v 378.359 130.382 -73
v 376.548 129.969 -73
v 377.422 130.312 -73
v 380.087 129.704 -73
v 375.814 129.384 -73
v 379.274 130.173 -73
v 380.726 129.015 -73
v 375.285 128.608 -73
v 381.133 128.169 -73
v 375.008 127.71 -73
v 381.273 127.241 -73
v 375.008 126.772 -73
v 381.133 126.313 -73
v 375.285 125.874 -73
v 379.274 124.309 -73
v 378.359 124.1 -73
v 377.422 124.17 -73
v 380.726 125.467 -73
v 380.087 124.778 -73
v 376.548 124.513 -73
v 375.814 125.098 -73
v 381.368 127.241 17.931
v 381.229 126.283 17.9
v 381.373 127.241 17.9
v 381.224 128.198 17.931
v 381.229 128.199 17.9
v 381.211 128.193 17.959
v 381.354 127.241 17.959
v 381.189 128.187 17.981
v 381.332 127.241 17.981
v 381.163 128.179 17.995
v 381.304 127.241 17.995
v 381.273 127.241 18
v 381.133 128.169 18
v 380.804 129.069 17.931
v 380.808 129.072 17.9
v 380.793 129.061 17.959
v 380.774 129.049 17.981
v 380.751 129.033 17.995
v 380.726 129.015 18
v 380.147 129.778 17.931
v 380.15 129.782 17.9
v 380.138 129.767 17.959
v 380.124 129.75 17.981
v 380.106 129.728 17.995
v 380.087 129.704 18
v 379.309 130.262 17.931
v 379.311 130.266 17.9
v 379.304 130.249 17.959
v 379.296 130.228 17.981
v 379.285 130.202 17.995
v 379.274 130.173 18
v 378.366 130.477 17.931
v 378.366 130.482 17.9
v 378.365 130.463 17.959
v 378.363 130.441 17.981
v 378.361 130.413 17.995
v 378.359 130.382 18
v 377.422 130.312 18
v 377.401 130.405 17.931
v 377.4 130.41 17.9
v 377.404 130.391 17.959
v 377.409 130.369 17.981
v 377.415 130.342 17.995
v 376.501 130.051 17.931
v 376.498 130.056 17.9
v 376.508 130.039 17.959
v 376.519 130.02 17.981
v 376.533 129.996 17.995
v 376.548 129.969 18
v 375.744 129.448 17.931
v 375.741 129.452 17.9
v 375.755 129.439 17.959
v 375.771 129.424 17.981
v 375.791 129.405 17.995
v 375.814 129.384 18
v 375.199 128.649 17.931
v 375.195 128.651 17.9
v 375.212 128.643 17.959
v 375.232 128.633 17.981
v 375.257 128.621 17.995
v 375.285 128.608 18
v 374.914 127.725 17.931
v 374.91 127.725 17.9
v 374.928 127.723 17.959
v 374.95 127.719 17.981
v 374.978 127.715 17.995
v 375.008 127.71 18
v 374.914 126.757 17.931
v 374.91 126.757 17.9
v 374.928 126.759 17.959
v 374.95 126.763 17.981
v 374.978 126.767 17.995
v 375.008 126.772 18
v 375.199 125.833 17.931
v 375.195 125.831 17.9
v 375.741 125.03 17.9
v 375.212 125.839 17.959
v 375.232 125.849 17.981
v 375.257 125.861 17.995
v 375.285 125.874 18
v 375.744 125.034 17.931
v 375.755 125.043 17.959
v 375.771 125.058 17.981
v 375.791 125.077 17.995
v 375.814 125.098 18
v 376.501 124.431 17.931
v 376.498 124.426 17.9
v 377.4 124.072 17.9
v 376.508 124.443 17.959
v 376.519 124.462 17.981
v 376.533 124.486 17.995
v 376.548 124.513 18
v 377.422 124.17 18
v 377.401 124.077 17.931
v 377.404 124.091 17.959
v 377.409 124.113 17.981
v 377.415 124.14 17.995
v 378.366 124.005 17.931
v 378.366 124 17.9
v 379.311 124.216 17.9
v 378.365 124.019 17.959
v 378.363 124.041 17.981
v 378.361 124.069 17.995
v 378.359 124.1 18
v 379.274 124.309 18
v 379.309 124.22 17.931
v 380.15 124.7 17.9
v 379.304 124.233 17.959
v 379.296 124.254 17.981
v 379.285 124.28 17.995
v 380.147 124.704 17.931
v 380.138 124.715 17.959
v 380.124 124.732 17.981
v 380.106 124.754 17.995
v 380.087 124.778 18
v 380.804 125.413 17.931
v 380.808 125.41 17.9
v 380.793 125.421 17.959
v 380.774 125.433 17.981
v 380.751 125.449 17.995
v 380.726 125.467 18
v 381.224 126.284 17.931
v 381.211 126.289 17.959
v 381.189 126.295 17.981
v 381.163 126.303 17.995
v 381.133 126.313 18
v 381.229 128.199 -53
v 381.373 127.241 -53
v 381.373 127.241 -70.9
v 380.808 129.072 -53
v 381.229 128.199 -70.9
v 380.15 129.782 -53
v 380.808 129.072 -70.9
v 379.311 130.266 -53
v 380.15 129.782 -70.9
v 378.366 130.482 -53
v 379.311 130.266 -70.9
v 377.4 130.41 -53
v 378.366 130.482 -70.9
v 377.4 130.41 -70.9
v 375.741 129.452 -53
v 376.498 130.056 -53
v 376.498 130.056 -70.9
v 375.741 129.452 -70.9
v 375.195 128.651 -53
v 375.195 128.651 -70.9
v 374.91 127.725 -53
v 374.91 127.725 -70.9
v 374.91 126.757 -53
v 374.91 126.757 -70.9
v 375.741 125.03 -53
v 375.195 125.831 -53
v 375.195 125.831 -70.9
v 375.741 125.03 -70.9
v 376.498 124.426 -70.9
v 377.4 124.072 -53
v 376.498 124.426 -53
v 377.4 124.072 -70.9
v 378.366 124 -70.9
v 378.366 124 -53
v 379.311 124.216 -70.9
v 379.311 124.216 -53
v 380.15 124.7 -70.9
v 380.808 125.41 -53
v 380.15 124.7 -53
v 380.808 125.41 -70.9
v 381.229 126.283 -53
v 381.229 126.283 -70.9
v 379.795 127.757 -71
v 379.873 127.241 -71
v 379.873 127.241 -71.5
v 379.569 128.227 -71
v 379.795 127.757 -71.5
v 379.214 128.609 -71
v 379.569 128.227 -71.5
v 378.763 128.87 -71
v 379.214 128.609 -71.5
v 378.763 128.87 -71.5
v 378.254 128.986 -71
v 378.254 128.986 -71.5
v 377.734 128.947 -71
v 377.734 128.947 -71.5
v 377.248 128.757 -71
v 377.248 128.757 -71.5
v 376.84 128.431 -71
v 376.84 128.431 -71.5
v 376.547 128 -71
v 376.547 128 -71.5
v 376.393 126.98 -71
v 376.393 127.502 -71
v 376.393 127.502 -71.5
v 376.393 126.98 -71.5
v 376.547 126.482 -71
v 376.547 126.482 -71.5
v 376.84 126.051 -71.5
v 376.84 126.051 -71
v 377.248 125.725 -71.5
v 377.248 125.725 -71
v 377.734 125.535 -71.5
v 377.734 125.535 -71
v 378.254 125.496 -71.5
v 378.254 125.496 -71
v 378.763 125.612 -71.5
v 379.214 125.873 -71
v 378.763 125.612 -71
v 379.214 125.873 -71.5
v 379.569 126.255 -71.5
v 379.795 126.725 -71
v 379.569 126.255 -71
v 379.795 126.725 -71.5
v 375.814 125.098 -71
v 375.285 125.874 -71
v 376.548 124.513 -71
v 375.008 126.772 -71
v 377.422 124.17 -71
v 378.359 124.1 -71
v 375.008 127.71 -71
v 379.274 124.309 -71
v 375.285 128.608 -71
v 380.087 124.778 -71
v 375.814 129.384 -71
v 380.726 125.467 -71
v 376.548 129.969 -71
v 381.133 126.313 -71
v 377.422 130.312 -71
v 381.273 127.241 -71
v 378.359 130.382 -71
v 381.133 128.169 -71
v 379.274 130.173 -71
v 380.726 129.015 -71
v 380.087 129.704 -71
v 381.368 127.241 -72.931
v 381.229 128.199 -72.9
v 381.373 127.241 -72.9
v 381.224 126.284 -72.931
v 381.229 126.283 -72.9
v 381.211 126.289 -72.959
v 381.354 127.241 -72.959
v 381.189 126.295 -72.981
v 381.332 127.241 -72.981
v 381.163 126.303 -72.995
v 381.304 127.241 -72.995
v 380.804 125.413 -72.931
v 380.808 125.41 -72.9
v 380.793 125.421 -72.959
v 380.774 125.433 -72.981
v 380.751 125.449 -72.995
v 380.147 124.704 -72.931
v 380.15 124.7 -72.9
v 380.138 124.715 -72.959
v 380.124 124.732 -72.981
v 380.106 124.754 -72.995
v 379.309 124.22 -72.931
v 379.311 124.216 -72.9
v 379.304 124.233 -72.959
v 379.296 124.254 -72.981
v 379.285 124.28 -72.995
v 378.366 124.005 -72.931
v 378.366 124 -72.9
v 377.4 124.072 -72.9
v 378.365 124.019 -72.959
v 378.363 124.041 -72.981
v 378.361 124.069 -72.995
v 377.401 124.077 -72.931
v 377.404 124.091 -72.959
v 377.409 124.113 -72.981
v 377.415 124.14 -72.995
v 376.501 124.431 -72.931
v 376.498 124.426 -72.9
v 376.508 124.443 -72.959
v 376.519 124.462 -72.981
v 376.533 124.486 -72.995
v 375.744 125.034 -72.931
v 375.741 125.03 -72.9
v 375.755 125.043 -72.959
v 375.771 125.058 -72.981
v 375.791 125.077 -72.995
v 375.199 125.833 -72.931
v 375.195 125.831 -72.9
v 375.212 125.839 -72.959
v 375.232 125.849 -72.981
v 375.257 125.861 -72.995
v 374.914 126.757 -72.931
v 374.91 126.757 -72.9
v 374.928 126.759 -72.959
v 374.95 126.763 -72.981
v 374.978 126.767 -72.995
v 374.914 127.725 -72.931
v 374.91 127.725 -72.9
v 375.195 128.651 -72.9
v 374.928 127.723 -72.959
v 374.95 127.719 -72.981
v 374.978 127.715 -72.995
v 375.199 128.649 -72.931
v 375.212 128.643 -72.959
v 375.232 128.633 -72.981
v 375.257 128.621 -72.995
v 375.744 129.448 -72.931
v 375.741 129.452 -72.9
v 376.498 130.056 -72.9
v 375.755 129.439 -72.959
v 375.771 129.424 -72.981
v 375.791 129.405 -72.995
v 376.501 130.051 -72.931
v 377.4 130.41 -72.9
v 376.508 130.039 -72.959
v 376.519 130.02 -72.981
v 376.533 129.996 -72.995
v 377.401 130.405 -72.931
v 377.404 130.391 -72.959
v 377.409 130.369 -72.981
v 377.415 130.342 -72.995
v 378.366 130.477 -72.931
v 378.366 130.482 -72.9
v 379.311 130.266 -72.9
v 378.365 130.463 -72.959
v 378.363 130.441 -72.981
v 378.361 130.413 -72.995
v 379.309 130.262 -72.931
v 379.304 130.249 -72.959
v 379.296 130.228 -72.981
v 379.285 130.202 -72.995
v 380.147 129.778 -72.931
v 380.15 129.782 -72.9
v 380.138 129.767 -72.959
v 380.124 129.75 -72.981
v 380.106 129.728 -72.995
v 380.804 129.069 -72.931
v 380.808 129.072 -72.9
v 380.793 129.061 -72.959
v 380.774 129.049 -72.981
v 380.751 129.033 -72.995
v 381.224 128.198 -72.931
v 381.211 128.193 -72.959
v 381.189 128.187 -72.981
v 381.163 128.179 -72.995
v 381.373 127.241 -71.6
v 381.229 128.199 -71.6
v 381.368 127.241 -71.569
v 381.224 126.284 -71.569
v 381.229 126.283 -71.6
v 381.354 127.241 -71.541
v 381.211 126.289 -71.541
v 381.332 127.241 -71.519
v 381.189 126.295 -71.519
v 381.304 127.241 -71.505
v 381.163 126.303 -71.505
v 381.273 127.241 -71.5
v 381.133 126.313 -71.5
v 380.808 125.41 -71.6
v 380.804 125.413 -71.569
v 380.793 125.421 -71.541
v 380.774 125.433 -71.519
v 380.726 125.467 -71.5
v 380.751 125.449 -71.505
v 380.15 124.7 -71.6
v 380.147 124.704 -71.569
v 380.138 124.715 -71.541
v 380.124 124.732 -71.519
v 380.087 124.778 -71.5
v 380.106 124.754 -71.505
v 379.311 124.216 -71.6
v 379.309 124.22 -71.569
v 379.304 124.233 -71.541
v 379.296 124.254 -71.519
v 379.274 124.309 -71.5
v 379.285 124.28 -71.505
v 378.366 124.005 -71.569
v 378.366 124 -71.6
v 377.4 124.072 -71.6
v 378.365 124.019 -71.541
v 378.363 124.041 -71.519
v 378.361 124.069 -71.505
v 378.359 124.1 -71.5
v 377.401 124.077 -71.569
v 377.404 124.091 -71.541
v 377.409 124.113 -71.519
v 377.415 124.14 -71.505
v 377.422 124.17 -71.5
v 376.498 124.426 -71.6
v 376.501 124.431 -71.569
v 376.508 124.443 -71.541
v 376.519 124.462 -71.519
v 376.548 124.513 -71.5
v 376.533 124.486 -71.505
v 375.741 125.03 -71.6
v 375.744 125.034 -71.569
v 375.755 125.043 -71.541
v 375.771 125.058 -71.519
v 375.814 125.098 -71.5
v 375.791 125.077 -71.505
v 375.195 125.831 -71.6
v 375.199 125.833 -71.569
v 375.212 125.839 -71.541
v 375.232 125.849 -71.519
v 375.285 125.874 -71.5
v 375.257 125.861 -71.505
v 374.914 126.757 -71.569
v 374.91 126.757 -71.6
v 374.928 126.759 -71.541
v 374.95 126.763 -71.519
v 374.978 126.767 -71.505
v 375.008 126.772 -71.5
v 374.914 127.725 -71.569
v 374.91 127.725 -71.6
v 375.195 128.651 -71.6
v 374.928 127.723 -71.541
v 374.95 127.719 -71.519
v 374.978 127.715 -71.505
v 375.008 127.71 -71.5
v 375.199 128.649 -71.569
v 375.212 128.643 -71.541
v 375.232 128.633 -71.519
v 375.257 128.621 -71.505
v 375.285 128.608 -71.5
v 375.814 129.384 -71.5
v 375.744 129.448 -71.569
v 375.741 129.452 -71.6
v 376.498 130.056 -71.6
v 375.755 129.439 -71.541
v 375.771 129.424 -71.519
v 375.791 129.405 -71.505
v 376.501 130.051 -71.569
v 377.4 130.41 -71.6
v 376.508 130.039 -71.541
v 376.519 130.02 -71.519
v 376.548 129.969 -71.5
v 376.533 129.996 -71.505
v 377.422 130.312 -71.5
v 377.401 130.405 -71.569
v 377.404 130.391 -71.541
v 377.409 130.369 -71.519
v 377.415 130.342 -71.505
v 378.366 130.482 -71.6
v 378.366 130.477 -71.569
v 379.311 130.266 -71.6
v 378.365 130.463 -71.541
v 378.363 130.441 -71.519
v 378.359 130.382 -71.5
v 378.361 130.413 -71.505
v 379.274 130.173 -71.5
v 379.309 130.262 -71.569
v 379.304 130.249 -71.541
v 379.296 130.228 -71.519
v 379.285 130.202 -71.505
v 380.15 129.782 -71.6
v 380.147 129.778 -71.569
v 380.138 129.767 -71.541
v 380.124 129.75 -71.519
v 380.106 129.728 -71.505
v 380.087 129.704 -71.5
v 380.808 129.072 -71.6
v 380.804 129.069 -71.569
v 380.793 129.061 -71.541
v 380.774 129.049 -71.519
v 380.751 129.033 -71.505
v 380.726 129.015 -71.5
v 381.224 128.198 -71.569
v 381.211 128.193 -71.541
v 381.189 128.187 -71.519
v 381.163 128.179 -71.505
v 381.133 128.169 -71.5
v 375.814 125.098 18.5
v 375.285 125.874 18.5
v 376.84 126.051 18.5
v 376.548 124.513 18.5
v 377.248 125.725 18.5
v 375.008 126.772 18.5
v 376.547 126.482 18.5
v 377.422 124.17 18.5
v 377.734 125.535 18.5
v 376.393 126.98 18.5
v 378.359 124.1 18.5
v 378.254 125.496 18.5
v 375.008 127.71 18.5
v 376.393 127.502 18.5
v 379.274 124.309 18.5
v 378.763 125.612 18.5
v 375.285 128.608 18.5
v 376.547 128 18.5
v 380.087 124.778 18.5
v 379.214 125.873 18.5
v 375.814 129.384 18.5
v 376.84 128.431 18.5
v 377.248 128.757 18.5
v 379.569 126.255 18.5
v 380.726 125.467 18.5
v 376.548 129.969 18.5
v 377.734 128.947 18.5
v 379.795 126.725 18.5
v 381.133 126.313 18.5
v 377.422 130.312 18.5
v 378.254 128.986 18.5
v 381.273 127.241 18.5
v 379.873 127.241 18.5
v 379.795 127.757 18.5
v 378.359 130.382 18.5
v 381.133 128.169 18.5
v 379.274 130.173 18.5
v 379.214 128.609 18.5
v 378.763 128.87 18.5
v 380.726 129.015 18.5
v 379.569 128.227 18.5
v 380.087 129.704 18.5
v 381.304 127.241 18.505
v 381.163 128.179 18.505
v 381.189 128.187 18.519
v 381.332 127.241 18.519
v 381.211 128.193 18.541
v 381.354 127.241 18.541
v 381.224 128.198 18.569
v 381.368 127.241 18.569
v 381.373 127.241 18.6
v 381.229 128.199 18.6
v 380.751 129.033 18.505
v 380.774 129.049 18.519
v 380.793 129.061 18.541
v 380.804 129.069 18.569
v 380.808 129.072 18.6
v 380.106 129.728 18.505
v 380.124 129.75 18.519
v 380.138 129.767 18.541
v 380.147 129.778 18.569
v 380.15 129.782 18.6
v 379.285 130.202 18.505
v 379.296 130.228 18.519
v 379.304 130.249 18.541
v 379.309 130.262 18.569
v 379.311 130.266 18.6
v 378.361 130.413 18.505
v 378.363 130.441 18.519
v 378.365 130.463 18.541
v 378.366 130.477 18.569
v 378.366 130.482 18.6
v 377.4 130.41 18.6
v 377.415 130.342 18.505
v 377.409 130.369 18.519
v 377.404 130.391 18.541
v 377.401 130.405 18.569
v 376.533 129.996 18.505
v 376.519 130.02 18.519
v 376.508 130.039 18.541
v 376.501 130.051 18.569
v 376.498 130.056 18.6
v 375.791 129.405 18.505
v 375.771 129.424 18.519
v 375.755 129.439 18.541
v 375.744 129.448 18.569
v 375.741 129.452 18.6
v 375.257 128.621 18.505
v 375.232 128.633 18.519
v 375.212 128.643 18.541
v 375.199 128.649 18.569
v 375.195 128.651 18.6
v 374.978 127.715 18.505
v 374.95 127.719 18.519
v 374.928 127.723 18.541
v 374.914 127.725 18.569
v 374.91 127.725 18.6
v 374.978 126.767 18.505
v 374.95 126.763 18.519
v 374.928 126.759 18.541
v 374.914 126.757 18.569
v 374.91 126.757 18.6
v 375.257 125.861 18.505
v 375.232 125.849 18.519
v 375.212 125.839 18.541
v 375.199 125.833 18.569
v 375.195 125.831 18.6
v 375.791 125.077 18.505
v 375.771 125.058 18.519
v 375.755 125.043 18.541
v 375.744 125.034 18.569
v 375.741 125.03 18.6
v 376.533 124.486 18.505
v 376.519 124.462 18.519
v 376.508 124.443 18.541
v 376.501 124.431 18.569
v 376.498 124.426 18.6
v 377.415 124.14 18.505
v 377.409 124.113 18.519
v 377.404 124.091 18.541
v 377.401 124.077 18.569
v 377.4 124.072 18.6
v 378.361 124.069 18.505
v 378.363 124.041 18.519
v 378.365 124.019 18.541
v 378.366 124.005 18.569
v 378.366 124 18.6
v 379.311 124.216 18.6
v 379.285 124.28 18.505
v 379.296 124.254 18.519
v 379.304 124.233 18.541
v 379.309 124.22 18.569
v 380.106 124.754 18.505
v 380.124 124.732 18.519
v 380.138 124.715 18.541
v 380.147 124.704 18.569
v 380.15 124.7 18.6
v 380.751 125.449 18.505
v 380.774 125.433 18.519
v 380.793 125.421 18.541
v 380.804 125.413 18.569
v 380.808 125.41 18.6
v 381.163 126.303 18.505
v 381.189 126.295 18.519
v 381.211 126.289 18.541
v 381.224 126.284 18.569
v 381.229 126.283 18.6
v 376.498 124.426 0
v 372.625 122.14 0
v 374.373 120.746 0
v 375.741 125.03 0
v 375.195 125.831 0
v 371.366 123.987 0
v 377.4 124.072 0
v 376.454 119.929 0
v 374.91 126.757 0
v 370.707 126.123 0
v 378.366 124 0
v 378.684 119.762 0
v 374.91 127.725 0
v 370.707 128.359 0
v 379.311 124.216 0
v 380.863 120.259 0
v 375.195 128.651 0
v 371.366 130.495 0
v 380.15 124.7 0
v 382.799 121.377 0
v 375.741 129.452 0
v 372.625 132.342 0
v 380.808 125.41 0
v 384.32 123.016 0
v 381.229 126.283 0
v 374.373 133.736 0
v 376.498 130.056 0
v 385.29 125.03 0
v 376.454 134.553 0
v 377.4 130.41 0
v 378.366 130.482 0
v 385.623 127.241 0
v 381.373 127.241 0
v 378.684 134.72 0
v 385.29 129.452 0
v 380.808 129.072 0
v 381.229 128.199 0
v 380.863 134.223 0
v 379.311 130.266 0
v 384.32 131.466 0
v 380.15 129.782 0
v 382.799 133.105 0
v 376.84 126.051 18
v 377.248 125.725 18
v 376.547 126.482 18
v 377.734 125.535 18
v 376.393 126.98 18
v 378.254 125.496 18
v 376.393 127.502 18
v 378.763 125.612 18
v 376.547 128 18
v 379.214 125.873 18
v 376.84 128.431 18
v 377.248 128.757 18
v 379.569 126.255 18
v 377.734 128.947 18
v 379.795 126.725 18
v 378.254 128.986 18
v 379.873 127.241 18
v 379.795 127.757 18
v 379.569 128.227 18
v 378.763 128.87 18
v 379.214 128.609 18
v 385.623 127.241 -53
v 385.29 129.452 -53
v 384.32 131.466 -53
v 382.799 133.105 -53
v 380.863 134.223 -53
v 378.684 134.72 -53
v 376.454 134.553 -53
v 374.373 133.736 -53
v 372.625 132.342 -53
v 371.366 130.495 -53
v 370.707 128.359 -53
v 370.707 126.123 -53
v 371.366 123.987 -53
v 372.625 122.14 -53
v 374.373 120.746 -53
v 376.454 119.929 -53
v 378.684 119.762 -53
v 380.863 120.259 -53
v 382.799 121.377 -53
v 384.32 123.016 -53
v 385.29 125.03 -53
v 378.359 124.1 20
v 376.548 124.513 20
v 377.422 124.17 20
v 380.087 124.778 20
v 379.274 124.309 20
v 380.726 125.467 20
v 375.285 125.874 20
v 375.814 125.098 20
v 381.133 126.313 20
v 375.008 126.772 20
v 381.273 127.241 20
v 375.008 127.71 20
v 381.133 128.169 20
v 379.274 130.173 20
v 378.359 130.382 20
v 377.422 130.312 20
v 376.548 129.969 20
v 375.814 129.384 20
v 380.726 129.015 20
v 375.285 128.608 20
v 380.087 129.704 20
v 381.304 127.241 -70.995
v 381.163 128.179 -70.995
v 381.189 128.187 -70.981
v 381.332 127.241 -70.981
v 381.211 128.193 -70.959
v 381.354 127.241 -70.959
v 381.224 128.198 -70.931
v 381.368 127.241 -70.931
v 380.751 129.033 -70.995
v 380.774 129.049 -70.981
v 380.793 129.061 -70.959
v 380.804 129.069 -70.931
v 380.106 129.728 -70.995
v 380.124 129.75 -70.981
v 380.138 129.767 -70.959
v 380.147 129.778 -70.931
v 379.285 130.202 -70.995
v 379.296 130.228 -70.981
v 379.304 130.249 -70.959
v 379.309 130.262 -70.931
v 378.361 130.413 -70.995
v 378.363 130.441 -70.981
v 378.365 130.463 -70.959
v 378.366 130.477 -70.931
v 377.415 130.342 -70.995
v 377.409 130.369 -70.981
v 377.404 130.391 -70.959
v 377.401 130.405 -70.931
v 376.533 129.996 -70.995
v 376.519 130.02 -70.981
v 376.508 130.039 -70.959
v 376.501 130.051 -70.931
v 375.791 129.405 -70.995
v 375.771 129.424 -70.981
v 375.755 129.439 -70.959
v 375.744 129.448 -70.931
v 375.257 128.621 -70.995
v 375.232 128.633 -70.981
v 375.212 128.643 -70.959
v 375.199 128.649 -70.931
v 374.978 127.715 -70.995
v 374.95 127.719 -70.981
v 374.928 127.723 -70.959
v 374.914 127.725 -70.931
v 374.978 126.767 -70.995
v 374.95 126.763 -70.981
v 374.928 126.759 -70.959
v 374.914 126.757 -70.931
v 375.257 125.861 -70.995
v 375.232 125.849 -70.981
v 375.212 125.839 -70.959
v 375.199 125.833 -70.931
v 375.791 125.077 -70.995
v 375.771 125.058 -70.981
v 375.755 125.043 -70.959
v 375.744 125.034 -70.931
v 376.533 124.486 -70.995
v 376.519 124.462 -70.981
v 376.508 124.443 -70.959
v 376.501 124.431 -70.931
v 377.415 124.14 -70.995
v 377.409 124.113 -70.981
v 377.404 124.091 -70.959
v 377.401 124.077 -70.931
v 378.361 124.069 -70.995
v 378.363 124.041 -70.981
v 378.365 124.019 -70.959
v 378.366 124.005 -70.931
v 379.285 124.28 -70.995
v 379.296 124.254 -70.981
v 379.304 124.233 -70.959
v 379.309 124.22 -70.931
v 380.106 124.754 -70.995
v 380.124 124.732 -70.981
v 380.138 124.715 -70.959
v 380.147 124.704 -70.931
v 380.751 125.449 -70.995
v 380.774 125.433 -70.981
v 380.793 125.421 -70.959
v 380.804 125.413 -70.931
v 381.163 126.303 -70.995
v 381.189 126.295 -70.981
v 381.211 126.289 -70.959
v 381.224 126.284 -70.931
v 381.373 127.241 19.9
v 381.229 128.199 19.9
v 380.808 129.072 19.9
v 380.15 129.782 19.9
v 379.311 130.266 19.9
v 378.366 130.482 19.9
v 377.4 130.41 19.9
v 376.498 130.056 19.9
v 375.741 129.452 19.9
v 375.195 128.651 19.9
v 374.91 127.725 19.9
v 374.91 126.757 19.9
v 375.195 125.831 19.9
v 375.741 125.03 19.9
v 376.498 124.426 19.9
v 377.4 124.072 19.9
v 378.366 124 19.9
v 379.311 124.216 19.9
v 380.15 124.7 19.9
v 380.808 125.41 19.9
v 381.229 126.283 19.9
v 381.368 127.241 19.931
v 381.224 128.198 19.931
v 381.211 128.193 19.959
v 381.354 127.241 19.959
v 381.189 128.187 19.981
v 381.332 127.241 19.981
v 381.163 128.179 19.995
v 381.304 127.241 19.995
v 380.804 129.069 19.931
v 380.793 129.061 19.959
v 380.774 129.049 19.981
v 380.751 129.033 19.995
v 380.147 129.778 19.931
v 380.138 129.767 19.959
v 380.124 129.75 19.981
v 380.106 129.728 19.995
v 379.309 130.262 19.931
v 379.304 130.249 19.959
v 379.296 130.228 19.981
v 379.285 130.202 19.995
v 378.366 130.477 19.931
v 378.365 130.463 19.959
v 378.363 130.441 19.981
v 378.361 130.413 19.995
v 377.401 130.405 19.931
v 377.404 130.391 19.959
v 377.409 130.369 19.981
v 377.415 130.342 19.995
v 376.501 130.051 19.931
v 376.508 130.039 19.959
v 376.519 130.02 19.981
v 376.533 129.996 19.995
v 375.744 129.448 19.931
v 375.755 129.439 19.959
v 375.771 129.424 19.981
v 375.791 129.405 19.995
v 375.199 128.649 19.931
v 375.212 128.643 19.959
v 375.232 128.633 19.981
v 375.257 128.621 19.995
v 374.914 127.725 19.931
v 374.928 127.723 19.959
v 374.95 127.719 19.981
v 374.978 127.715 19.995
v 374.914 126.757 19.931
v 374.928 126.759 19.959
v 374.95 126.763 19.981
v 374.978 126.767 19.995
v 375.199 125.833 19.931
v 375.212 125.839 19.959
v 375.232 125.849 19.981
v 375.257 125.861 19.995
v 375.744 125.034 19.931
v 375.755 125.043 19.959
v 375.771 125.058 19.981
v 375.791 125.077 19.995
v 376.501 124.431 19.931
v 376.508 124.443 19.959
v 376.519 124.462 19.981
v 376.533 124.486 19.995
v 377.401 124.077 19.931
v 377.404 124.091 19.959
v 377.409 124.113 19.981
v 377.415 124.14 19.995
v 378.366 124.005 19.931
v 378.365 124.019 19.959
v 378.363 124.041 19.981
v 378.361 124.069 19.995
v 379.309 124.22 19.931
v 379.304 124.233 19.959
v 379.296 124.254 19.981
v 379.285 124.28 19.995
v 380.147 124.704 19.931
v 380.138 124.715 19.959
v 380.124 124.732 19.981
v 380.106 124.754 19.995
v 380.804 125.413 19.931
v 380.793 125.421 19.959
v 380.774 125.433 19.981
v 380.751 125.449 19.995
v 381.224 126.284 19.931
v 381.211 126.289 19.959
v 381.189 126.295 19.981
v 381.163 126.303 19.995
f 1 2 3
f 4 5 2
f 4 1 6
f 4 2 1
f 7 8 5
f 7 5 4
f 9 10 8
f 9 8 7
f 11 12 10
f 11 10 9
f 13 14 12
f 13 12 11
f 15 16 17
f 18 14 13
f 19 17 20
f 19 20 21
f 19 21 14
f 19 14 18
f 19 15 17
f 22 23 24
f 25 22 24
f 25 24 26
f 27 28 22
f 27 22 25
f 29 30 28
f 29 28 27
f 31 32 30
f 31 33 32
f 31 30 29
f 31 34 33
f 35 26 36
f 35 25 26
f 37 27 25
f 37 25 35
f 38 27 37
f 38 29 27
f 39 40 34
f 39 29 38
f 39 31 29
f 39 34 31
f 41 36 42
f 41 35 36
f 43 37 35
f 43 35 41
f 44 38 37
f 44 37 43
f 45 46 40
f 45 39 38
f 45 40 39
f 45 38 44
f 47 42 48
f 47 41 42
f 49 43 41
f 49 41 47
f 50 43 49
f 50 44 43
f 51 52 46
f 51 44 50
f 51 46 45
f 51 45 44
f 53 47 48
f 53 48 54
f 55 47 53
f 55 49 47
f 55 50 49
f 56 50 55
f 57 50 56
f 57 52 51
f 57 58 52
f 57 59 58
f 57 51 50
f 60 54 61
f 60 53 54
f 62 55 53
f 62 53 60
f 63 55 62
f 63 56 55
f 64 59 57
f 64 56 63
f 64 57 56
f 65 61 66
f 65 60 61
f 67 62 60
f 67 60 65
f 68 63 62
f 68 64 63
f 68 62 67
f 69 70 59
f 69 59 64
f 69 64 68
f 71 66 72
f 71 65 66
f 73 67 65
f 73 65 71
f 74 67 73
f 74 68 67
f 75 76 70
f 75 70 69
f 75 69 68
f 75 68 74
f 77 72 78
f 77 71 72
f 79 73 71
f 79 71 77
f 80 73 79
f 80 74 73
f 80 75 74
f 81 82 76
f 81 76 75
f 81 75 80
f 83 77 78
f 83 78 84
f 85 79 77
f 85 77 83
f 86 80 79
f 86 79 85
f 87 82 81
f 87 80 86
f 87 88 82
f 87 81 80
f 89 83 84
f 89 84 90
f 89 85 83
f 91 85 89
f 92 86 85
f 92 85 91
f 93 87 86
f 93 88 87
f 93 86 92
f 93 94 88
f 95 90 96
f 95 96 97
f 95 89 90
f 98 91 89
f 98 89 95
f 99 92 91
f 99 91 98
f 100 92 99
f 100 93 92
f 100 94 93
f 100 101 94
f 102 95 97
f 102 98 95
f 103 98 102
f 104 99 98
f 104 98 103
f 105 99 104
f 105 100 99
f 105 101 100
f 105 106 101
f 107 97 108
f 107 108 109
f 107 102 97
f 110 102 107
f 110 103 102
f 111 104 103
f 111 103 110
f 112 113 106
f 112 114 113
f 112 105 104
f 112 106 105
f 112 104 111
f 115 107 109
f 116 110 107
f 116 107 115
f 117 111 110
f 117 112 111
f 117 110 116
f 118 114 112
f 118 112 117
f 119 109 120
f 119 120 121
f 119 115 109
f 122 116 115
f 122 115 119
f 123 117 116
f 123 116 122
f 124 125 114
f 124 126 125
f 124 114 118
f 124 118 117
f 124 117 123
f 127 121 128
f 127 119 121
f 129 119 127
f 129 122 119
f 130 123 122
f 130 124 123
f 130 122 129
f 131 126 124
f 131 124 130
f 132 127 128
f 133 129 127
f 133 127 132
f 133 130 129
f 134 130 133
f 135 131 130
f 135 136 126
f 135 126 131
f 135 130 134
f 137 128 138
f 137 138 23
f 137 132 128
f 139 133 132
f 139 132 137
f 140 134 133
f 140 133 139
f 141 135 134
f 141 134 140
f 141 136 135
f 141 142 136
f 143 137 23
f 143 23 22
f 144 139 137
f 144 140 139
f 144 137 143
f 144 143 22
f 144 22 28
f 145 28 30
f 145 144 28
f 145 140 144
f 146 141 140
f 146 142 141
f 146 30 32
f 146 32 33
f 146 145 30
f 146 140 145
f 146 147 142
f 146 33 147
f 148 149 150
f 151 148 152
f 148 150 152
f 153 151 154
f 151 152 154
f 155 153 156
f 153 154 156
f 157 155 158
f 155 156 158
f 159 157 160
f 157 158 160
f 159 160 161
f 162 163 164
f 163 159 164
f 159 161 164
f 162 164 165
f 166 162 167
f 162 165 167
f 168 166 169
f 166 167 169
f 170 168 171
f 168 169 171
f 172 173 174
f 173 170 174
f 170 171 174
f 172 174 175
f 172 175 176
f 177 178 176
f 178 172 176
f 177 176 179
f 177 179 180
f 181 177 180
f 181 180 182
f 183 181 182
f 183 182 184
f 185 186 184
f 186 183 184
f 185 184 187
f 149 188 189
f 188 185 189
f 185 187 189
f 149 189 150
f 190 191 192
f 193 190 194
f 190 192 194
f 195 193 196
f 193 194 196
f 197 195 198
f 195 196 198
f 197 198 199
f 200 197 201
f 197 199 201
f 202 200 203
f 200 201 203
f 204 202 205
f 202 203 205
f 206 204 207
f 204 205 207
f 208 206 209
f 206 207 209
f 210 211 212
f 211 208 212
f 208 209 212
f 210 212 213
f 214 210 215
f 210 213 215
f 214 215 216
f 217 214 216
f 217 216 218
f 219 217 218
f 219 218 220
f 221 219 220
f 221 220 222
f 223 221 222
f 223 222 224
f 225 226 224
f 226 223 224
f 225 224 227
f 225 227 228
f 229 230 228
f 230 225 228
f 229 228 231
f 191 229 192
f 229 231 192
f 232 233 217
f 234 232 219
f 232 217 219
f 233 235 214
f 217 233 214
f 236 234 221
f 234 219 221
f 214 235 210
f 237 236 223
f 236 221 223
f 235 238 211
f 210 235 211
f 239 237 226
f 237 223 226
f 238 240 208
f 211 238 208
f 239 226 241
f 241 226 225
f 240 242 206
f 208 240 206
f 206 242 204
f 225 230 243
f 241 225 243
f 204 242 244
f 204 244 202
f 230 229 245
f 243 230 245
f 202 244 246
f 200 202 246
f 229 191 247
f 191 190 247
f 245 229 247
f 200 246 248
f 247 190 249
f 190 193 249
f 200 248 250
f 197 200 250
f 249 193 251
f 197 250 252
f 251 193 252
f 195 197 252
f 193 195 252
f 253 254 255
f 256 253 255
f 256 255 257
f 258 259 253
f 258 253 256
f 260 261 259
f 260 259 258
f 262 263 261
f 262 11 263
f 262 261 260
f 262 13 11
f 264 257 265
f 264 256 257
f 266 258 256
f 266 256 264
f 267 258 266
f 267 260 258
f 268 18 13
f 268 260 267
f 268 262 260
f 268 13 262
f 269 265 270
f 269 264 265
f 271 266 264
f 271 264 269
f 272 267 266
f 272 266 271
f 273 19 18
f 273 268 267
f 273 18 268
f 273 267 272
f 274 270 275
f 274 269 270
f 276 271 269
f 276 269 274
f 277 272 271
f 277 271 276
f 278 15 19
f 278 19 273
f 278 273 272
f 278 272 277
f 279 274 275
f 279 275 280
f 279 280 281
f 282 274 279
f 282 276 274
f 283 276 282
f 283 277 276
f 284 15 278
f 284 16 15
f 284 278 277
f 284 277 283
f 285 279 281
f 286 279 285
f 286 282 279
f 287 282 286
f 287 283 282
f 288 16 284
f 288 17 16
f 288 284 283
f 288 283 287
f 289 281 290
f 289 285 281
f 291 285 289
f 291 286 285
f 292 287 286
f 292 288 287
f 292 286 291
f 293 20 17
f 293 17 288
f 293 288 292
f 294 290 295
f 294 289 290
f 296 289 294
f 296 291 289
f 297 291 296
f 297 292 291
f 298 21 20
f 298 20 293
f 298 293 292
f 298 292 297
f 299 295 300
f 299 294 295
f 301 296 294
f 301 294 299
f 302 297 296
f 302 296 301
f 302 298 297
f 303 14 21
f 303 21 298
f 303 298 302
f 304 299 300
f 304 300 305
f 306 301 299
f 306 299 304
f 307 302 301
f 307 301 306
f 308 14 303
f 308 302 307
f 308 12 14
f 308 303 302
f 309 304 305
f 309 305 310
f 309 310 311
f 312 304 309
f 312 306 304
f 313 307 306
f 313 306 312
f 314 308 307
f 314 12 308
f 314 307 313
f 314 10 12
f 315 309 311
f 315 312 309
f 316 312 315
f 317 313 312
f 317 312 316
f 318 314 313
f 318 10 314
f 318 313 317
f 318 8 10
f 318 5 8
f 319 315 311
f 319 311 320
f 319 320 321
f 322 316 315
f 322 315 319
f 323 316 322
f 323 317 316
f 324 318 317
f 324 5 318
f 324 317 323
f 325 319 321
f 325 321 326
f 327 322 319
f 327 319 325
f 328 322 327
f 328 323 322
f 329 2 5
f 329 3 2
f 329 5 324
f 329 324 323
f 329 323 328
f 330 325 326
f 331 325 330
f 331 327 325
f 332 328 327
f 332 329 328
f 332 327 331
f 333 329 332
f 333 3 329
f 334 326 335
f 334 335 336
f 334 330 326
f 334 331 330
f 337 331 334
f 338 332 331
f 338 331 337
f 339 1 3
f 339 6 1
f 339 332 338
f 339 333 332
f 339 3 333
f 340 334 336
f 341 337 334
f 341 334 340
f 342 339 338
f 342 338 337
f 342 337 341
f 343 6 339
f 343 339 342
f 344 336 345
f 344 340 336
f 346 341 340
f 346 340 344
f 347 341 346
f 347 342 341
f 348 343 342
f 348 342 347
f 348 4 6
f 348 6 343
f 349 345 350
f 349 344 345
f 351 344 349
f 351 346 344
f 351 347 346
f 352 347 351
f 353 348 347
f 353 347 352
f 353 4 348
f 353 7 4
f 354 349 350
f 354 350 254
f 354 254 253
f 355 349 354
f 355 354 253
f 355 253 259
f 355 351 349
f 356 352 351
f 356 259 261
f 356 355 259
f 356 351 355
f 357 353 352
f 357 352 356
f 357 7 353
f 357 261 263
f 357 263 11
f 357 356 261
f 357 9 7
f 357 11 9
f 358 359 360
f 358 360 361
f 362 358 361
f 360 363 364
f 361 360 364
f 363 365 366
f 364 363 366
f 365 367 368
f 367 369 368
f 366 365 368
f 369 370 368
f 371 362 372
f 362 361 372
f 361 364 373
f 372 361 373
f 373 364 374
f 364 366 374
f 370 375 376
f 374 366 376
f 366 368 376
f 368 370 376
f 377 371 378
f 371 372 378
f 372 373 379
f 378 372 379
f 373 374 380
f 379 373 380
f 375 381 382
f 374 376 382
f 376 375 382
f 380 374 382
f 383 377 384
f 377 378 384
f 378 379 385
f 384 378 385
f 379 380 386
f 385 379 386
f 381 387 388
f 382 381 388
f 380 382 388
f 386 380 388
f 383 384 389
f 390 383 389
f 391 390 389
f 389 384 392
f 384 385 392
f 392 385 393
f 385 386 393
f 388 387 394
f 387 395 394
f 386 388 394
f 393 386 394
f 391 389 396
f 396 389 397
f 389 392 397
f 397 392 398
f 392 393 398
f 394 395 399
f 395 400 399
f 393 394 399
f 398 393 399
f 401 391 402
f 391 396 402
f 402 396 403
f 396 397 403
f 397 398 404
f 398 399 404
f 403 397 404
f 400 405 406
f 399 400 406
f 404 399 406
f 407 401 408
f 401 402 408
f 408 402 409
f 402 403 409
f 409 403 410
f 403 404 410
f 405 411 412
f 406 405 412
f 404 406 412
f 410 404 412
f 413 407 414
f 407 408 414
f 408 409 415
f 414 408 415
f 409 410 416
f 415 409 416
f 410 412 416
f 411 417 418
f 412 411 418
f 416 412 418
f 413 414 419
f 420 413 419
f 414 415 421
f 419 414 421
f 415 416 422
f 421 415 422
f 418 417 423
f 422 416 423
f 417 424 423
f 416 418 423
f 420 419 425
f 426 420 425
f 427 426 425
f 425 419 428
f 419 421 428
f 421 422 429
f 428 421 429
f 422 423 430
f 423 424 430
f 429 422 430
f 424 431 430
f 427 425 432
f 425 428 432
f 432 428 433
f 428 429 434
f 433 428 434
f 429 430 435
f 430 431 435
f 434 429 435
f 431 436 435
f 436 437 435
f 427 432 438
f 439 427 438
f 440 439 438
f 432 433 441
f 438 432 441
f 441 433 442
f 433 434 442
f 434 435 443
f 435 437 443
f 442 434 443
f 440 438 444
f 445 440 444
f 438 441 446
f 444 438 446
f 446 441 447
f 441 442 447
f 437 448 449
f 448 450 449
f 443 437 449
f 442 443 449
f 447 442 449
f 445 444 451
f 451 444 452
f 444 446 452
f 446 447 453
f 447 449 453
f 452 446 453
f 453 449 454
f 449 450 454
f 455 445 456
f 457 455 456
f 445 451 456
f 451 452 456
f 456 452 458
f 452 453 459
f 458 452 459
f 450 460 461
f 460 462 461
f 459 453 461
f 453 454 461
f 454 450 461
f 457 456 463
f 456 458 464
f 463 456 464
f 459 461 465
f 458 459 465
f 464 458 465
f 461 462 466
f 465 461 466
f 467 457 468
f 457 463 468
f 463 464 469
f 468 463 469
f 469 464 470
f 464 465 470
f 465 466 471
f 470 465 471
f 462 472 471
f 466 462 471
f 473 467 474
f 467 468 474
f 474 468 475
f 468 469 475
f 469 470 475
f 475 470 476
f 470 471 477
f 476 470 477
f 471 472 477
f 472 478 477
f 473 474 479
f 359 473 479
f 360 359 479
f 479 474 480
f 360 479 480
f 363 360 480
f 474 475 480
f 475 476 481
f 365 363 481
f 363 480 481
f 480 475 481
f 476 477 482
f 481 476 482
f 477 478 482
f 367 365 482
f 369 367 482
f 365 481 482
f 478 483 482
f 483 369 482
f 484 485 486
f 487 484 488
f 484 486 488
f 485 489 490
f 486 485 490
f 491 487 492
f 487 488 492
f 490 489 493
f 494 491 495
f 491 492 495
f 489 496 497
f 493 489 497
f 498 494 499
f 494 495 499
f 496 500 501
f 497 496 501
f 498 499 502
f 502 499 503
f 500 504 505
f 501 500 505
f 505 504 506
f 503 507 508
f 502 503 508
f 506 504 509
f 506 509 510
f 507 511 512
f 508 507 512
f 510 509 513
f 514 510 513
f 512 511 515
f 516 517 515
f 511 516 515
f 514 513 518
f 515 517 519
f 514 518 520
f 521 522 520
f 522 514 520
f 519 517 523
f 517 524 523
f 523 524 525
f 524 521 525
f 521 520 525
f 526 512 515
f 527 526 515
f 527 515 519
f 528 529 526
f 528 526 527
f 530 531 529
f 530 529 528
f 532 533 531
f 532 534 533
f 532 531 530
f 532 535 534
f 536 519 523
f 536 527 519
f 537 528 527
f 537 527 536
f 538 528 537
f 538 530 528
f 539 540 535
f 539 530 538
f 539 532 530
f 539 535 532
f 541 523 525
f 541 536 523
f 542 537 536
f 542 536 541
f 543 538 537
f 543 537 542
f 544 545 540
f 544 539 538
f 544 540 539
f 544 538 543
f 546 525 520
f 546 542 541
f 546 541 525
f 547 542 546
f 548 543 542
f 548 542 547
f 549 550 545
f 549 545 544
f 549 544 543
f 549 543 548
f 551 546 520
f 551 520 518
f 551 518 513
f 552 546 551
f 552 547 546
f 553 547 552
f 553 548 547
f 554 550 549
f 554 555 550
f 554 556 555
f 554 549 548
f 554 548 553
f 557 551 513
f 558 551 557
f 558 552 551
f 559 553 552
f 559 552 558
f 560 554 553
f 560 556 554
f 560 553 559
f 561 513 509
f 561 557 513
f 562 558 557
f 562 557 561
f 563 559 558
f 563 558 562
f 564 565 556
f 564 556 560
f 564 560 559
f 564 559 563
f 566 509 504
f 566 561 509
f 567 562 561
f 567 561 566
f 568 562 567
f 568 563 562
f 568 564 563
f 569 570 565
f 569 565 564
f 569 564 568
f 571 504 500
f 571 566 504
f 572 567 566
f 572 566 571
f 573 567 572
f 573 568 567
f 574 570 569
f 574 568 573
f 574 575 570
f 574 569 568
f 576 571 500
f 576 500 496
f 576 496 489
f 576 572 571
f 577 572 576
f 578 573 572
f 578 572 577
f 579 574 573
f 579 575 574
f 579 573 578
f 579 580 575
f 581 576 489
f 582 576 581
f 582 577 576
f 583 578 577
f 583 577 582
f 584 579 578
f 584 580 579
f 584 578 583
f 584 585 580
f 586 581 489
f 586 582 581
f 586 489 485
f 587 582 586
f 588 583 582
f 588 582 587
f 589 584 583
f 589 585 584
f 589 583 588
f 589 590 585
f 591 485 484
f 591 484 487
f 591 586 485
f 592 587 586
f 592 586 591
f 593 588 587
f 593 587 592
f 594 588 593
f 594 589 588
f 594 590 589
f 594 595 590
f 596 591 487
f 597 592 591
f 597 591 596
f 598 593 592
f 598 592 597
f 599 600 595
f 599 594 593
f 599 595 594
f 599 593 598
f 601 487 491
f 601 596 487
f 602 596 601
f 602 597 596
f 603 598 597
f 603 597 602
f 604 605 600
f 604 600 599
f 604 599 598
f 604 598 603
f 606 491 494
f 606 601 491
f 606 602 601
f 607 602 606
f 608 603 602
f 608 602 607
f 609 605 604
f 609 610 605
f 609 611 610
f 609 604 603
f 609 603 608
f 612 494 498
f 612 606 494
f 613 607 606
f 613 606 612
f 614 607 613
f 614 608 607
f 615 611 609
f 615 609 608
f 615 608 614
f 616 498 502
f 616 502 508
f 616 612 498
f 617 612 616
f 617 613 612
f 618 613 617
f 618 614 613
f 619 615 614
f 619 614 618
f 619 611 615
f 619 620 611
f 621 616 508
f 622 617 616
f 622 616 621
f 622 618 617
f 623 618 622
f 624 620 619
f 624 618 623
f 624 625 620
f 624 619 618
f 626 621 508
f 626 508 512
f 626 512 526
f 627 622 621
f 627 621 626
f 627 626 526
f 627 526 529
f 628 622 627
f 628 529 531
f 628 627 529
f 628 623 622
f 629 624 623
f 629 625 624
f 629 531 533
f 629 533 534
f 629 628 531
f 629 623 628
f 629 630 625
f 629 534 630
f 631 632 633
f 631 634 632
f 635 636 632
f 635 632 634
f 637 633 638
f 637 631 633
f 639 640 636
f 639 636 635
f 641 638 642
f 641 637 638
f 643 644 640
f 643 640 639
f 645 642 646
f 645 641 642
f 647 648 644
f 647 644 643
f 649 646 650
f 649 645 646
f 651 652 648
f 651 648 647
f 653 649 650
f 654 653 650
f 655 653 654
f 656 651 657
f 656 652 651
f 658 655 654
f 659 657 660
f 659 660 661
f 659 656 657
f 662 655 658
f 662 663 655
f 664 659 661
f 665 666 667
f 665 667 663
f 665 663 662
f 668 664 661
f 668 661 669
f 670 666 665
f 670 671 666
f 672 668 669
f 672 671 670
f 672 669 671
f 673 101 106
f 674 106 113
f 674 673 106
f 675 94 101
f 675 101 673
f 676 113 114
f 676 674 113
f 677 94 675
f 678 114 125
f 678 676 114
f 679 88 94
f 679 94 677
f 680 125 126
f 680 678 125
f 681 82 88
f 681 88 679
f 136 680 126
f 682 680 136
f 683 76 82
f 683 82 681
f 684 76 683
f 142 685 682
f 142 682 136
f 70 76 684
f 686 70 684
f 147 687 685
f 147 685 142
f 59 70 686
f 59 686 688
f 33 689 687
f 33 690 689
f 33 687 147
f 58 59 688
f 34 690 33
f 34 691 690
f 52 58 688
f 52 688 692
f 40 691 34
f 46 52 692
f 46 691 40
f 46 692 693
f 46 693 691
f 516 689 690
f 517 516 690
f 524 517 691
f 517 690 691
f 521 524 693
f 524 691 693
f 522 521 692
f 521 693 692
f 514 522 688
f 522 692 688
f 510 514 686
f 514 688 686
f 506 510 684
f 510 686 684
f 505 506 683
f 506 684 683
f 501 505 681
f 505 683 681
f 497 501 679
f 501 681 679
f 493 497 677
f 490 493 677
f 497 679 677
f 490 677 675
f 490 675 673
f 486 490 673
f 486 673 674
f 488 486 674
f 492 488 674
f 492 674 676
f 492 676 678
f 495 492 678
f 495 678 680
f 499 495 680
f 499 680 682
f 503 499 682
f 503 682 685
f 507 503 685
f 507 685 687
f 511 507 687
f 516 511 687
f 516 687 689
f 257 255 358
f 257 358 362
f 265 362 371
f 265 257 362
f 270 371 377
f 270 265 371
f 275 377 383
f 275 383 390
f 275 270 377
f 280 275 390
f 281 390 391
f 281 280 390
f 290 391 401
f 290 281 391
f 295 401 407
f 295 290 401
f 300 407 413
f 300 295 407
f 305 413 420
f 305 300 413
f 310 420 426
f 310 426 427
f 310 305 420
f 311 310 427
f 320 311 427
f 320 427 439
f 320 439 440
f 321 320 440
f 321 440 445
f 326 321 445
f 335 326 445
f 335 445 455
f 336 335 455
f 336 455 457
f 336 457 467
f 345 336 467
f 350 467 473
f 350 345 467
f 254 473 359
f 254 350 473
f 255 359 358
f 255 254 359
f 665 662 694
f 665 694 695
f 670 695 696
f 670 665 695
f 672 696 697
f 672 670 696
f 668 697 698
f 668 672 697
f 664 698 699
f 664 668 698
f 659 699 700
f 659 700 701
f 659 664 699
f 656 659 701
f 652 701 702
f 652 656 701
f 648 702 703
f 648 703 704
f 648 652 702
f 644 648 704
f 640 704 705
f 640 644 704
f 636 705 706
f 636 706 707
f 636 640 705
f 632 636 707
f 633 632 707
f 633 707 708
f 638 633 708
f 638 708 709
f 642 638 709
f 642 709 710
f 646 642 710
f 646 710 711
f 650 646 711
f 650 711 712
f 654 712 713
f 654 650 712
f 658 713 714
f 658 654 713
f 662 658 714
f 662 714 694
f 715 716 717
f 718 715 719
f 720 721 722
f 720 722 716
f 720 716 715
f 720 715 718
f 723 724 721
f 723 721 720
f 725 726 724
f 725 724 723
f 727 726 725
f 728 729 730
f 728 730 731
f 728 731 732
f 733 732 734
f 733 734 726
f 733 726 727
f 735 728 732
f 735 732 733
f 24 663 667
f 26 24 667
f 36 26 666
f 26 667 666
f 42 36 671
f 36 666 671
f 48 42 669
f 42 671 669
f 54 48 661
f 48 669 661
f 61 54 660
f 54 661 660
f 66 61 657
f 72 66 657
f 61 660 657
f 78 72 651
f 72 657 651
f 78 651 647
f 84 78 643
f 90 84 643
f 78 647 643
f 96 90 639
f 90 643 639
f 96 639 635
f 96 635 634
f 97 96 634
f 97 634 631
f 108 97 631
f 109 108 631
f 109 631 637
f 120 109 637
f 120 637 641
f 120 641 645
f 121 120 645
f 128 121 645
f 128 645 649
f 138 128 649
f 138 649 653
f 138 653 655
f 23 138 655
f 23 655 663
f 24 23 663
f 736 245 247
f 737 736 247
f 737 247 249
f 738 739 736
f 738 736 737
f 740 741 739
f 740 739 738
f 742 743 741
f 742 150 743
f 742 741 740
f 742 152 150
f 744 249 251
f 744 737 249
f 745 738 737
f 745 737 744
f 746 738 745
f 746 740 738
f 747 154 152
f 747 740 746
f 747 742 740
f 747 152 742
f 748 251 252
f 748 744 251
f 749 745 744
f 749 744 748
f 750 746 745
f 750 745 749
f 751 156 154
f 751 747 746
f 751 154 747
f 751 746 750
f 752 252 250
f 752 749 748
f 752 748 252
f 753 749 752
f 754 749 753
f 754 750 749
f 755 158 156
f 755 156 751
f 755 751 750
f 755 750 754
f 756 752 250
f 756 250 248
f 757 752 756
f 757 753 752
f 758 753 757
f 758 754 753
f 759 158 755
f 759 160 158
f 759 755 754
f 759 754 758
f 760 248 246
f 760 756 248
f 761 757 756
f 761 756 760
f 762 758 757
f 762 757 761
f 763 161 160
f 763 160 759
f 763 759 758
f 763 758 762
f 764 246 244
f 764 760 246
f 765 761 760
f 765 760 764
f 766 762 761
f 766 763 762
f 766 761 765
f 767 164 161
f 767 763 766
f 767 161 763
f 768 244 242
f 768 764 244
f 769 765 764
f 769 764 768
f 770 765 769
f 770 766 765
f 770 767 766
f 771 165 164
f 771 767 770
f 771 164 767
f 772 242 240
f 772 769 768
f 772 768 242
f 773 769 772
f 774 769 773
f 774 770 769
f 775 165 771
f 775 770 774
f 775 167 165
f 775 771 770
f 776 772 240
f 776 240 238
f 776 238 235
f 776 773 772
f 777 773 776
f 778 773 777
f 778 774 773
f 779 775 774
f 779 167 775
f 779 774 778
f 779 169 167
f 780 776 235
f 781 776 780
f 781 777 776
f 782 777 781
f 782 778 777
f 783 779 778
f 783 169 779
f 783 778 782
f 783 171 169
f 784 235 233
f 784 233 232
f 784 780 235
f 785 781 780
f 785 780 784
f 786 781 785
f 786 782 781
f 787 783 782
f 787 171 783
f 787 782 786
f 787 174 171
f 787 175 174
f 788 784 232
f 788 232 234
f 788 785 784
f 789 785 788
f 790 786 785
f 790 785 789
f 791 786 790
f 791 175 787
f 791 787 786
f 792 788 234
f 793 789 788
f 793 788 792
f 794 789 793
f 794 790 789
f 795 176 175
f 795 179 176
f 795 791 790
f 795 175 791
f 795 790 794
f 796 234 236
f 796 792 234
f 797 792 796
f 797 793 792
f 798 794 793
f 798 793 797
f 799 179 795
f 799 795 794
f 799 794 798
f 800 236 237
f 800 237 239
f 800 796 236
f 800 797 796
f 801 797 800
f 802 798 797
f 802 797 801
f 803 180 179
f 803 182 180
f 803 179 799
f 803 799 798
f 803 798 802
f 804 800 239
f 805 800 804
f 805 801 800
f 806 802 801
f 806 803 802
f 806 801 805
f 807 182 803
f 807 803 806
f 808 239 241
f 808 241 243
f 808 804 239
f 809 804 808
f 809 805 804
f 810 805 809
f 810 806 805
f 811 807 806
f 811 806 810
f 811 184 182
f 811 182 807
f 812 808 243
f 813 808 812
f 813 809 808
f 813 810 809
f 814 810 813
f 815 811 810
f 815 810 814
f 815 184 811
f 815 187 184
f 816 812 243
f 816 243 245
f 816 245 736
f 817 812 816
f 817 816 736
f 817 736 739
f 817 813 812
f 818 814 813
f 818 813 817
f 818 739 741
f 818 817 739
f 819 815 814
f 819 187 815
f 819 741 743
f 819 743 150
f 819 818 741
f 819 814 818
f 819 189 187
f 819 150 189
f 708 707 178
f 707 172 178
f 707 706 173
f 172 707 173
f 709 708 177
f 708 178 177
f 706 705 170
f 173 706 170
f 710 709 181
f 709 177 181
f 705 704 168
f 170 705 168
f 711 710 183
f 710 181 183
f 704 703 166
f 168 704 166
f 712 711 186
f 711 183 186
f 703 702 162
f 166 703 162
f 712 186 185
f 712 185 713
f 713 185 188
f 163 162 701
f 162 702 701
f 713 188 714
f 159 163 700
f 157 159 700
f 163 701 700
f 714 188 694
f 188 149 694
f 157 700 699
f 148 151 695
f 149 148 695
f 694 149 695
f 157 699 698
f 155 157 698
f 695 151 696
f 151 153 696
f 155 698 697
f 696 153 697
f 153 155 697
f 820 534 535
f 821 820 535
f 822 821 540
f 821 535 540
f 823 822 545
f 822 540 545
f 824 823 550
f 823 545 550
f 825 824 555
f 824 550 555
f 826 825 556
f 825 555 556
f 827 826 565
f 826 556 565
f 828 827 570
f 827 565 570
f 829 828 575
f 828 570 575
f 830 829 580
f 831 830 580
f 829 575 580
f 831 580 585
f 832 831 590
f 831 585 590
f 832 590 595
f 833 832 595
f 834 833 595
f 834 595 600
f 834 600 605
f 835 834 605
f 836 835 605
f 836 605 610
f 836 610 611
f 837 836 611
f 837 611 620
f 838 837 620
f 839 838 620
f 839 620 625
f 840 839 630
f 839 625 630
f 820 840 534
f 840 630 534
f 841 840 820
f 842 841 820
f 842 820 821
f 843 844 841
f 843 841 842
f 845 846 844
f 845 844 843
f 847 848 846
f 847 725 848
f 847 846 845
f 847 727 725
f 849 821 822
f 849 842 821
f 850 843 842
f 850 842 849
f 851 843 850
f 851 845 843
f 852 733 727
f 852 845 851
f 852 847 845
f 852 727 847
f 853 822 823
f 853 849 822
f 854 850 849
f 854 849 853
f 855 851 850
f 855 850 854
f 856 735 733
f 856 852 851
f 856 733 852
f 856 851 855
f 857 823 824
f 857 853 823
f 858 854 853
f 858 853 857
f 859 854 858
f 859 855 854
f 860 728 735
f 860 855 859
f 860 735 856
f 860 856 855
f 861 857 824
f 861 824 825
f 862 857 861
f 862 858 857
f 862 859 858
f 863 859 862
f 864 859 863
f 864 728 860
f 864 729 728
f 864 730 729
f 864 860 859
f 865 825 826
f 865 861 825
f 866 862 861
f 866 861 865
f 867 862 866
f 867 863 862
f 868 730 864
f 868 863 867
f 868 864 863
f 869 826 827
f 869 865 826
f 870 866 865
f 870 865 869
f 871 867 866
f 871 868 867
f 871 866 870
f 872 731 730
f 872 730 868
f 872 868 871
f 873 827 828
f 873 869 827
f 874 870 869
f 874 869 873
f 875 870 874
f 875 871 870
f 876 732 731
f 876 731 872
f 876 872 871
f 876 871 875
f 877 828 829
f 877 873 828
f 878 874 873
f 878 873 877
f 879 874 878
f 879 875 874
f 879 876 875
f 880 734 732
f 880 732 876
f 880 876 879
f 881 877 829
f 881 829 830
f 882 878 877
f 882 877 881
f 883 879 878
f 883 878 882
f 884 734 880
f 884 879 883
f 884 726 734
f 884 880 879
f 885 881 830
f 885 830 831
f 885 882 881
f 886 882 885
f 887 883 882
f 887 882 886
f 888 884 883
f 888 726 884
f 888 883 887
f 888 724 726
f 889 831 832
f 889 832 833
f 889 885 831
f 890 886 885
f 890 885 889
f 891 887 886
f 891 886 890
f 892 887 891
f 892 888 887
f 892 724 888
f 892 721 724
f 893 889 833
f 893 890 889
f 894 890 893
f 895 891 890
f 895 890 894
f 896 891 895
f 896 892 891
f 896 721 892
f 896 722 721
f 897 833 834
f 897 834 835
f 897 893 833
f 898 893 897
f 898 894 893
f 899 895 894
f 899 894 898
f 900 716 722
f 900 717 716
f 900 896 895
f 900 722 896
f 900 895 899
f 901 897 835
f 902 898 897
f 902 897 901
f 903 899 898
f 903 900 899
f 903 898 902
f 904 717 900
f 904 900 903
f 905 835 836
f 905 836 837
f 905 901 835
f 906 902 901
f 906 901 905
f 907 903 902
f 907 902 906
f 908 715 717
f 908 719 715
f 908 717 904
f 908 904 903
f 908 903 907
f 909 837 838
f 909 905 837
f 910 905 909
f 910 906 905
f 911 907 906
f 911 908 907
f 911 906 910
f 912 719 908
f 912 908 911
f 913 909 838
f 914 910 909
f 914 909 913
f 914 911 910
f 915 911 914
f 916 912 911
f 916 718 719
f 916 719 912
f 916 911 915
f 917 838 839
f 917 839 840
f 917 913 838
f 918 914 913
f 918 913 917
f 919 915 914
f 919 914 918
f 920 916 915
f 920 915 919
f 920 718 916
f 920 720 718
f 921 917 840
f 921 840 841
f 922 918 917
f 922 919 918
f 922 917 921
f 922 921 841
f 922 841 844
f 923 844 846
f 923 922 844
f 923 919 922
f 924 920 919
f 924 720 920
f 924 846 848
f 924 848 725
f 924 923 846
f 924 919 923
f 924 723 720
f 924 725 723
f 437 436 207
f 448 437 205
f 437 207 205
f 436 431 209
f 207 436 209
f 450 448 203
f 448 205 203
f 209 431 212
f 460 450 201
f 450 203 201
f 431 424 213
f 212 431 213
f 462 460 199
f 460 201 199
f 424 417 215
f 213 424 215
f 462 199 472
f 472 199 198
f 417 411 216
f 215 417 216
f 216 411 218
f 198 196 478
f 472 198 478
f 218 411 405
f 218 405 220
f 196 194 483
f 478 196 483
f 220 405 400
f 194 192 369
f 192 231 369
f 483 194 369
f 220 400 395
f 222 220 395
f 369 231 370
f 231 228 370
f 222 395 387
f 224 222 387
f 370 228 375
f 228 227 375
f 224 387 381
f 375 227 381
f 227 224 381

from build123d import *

# Parameters (mm, degrees)
SKETCH1_R                = 7.5
BOSS_EXTRUDE1_DEPTH      = 53
BOSS_EXTRUDE2_DEPTH      = 18
BOSS_EXTRUDE2_DEPTH_BACK = 71
SKETCH2_R                = 3.25
BOSS_EXTRUDE3_DEPTH      = 0.5
BOSS_EXTRUDE3_DEPTH_BACK = 89.5
SKETCH3_R                = 1.75
SKETCH4_R                = 3.25
BOSS_EXTRUDE4_DEPTH      = 1.5
BOSS_EXTRUDE5_START      = 1.5
SKETCH5_R                = 3.25
BOSS_EXTRUDE5_DEPTH      = 1.5
FILLET1_R                = 0.1
FILLET2_R                = 0.1


with BuildPart() as part:
    # Sketch1 → Boss-Extrude1 (new body)
    with BuildSketch(Plane.XY):
        with Locations((378.123219941, 127.240995388)):
            Circle(SKETCH1_R)
    extrude(amount=-BOSS_EXTRUDE1_DEPTH)

    # Sketch2 → Boss-Extrude2 (add, two sides: drawn at the far end of the back side and taken through both)
    with BuildSketch(Plane.XY.offset(-BOSS_EXTRUDE2_DEPTH_BACK)):
        with Locations((378.123219941, 127.240995388)):
            Circle(SKETCH2_R)
    extrude(amount=BOSS_EXTRUDE2_DEPTH + BOSS_EXTRUDE2_DEPTH_BACK)

    # Sketch3 → Boss-Extrude3 (add, two sides: drawn at the far end of the back side and taken through both)
    with BuildSketch(Plane.XY.offset(18).offset(-BOSS_EXTRUDE3_DEPTH_BACK)):
        with Locations((378.123219941, 127.240995388)):
            Circle(SKETCH3_R)
    extrude(amount=BOSS_EXTRUDE3_DEPTH + BOSS_EXTRUDE3_DEPTH_BACK)

    # Sketch4 → Boss-Extrude4 (add)
    with BuildSketch(Plane.XY.offset(18.5)):
        with Locations((378.123219941, 127.240995388)):
            Circle(SKETCH4_R)
    extrude(amount=BOSS_EXTRUDE4_DEPTH)

    # Sketch5 → Boss-Extrude5 (add)
    with BuildSketch(Plane(origin=(0, 0, -71.5), x_dir=(-1, 0, 0), z_dir=(0, 0, -1)).offset(BOSS_EXTRUDE5_START)):
        with Locations(Location((-378.123219941, 127.240995388, 0), (0, 0, 180))):
            Circle(SKETCH5_R)
    extrude(amount=-BOSS_EXTRUDE5_DEPTH)

    # Fillet1
    fillet1_edges = [part.edges().sort_by_distance(p)[0] for p in [
        (374.873219941, 127.240995388, 18.5),
        (374.873219941, 127.240995388, -71.5),
        (374.873219941, 127.240995388, -71),
        (374.873219941, 127.240995388, 18),
    ]]
    fillet(fillet1_edges, radius=FILLET1_R)

    # Fillet2
    fillet2_edges = [part.edges().sort_by_distance(p)[0] for p in [
        (374.873219941, 127.240995388, 20),
        (374.873219941, 127.240995388, -73),
    ]]
    fillet(fillet2_edges, radius=FILLET2_R)


solid = part.part
